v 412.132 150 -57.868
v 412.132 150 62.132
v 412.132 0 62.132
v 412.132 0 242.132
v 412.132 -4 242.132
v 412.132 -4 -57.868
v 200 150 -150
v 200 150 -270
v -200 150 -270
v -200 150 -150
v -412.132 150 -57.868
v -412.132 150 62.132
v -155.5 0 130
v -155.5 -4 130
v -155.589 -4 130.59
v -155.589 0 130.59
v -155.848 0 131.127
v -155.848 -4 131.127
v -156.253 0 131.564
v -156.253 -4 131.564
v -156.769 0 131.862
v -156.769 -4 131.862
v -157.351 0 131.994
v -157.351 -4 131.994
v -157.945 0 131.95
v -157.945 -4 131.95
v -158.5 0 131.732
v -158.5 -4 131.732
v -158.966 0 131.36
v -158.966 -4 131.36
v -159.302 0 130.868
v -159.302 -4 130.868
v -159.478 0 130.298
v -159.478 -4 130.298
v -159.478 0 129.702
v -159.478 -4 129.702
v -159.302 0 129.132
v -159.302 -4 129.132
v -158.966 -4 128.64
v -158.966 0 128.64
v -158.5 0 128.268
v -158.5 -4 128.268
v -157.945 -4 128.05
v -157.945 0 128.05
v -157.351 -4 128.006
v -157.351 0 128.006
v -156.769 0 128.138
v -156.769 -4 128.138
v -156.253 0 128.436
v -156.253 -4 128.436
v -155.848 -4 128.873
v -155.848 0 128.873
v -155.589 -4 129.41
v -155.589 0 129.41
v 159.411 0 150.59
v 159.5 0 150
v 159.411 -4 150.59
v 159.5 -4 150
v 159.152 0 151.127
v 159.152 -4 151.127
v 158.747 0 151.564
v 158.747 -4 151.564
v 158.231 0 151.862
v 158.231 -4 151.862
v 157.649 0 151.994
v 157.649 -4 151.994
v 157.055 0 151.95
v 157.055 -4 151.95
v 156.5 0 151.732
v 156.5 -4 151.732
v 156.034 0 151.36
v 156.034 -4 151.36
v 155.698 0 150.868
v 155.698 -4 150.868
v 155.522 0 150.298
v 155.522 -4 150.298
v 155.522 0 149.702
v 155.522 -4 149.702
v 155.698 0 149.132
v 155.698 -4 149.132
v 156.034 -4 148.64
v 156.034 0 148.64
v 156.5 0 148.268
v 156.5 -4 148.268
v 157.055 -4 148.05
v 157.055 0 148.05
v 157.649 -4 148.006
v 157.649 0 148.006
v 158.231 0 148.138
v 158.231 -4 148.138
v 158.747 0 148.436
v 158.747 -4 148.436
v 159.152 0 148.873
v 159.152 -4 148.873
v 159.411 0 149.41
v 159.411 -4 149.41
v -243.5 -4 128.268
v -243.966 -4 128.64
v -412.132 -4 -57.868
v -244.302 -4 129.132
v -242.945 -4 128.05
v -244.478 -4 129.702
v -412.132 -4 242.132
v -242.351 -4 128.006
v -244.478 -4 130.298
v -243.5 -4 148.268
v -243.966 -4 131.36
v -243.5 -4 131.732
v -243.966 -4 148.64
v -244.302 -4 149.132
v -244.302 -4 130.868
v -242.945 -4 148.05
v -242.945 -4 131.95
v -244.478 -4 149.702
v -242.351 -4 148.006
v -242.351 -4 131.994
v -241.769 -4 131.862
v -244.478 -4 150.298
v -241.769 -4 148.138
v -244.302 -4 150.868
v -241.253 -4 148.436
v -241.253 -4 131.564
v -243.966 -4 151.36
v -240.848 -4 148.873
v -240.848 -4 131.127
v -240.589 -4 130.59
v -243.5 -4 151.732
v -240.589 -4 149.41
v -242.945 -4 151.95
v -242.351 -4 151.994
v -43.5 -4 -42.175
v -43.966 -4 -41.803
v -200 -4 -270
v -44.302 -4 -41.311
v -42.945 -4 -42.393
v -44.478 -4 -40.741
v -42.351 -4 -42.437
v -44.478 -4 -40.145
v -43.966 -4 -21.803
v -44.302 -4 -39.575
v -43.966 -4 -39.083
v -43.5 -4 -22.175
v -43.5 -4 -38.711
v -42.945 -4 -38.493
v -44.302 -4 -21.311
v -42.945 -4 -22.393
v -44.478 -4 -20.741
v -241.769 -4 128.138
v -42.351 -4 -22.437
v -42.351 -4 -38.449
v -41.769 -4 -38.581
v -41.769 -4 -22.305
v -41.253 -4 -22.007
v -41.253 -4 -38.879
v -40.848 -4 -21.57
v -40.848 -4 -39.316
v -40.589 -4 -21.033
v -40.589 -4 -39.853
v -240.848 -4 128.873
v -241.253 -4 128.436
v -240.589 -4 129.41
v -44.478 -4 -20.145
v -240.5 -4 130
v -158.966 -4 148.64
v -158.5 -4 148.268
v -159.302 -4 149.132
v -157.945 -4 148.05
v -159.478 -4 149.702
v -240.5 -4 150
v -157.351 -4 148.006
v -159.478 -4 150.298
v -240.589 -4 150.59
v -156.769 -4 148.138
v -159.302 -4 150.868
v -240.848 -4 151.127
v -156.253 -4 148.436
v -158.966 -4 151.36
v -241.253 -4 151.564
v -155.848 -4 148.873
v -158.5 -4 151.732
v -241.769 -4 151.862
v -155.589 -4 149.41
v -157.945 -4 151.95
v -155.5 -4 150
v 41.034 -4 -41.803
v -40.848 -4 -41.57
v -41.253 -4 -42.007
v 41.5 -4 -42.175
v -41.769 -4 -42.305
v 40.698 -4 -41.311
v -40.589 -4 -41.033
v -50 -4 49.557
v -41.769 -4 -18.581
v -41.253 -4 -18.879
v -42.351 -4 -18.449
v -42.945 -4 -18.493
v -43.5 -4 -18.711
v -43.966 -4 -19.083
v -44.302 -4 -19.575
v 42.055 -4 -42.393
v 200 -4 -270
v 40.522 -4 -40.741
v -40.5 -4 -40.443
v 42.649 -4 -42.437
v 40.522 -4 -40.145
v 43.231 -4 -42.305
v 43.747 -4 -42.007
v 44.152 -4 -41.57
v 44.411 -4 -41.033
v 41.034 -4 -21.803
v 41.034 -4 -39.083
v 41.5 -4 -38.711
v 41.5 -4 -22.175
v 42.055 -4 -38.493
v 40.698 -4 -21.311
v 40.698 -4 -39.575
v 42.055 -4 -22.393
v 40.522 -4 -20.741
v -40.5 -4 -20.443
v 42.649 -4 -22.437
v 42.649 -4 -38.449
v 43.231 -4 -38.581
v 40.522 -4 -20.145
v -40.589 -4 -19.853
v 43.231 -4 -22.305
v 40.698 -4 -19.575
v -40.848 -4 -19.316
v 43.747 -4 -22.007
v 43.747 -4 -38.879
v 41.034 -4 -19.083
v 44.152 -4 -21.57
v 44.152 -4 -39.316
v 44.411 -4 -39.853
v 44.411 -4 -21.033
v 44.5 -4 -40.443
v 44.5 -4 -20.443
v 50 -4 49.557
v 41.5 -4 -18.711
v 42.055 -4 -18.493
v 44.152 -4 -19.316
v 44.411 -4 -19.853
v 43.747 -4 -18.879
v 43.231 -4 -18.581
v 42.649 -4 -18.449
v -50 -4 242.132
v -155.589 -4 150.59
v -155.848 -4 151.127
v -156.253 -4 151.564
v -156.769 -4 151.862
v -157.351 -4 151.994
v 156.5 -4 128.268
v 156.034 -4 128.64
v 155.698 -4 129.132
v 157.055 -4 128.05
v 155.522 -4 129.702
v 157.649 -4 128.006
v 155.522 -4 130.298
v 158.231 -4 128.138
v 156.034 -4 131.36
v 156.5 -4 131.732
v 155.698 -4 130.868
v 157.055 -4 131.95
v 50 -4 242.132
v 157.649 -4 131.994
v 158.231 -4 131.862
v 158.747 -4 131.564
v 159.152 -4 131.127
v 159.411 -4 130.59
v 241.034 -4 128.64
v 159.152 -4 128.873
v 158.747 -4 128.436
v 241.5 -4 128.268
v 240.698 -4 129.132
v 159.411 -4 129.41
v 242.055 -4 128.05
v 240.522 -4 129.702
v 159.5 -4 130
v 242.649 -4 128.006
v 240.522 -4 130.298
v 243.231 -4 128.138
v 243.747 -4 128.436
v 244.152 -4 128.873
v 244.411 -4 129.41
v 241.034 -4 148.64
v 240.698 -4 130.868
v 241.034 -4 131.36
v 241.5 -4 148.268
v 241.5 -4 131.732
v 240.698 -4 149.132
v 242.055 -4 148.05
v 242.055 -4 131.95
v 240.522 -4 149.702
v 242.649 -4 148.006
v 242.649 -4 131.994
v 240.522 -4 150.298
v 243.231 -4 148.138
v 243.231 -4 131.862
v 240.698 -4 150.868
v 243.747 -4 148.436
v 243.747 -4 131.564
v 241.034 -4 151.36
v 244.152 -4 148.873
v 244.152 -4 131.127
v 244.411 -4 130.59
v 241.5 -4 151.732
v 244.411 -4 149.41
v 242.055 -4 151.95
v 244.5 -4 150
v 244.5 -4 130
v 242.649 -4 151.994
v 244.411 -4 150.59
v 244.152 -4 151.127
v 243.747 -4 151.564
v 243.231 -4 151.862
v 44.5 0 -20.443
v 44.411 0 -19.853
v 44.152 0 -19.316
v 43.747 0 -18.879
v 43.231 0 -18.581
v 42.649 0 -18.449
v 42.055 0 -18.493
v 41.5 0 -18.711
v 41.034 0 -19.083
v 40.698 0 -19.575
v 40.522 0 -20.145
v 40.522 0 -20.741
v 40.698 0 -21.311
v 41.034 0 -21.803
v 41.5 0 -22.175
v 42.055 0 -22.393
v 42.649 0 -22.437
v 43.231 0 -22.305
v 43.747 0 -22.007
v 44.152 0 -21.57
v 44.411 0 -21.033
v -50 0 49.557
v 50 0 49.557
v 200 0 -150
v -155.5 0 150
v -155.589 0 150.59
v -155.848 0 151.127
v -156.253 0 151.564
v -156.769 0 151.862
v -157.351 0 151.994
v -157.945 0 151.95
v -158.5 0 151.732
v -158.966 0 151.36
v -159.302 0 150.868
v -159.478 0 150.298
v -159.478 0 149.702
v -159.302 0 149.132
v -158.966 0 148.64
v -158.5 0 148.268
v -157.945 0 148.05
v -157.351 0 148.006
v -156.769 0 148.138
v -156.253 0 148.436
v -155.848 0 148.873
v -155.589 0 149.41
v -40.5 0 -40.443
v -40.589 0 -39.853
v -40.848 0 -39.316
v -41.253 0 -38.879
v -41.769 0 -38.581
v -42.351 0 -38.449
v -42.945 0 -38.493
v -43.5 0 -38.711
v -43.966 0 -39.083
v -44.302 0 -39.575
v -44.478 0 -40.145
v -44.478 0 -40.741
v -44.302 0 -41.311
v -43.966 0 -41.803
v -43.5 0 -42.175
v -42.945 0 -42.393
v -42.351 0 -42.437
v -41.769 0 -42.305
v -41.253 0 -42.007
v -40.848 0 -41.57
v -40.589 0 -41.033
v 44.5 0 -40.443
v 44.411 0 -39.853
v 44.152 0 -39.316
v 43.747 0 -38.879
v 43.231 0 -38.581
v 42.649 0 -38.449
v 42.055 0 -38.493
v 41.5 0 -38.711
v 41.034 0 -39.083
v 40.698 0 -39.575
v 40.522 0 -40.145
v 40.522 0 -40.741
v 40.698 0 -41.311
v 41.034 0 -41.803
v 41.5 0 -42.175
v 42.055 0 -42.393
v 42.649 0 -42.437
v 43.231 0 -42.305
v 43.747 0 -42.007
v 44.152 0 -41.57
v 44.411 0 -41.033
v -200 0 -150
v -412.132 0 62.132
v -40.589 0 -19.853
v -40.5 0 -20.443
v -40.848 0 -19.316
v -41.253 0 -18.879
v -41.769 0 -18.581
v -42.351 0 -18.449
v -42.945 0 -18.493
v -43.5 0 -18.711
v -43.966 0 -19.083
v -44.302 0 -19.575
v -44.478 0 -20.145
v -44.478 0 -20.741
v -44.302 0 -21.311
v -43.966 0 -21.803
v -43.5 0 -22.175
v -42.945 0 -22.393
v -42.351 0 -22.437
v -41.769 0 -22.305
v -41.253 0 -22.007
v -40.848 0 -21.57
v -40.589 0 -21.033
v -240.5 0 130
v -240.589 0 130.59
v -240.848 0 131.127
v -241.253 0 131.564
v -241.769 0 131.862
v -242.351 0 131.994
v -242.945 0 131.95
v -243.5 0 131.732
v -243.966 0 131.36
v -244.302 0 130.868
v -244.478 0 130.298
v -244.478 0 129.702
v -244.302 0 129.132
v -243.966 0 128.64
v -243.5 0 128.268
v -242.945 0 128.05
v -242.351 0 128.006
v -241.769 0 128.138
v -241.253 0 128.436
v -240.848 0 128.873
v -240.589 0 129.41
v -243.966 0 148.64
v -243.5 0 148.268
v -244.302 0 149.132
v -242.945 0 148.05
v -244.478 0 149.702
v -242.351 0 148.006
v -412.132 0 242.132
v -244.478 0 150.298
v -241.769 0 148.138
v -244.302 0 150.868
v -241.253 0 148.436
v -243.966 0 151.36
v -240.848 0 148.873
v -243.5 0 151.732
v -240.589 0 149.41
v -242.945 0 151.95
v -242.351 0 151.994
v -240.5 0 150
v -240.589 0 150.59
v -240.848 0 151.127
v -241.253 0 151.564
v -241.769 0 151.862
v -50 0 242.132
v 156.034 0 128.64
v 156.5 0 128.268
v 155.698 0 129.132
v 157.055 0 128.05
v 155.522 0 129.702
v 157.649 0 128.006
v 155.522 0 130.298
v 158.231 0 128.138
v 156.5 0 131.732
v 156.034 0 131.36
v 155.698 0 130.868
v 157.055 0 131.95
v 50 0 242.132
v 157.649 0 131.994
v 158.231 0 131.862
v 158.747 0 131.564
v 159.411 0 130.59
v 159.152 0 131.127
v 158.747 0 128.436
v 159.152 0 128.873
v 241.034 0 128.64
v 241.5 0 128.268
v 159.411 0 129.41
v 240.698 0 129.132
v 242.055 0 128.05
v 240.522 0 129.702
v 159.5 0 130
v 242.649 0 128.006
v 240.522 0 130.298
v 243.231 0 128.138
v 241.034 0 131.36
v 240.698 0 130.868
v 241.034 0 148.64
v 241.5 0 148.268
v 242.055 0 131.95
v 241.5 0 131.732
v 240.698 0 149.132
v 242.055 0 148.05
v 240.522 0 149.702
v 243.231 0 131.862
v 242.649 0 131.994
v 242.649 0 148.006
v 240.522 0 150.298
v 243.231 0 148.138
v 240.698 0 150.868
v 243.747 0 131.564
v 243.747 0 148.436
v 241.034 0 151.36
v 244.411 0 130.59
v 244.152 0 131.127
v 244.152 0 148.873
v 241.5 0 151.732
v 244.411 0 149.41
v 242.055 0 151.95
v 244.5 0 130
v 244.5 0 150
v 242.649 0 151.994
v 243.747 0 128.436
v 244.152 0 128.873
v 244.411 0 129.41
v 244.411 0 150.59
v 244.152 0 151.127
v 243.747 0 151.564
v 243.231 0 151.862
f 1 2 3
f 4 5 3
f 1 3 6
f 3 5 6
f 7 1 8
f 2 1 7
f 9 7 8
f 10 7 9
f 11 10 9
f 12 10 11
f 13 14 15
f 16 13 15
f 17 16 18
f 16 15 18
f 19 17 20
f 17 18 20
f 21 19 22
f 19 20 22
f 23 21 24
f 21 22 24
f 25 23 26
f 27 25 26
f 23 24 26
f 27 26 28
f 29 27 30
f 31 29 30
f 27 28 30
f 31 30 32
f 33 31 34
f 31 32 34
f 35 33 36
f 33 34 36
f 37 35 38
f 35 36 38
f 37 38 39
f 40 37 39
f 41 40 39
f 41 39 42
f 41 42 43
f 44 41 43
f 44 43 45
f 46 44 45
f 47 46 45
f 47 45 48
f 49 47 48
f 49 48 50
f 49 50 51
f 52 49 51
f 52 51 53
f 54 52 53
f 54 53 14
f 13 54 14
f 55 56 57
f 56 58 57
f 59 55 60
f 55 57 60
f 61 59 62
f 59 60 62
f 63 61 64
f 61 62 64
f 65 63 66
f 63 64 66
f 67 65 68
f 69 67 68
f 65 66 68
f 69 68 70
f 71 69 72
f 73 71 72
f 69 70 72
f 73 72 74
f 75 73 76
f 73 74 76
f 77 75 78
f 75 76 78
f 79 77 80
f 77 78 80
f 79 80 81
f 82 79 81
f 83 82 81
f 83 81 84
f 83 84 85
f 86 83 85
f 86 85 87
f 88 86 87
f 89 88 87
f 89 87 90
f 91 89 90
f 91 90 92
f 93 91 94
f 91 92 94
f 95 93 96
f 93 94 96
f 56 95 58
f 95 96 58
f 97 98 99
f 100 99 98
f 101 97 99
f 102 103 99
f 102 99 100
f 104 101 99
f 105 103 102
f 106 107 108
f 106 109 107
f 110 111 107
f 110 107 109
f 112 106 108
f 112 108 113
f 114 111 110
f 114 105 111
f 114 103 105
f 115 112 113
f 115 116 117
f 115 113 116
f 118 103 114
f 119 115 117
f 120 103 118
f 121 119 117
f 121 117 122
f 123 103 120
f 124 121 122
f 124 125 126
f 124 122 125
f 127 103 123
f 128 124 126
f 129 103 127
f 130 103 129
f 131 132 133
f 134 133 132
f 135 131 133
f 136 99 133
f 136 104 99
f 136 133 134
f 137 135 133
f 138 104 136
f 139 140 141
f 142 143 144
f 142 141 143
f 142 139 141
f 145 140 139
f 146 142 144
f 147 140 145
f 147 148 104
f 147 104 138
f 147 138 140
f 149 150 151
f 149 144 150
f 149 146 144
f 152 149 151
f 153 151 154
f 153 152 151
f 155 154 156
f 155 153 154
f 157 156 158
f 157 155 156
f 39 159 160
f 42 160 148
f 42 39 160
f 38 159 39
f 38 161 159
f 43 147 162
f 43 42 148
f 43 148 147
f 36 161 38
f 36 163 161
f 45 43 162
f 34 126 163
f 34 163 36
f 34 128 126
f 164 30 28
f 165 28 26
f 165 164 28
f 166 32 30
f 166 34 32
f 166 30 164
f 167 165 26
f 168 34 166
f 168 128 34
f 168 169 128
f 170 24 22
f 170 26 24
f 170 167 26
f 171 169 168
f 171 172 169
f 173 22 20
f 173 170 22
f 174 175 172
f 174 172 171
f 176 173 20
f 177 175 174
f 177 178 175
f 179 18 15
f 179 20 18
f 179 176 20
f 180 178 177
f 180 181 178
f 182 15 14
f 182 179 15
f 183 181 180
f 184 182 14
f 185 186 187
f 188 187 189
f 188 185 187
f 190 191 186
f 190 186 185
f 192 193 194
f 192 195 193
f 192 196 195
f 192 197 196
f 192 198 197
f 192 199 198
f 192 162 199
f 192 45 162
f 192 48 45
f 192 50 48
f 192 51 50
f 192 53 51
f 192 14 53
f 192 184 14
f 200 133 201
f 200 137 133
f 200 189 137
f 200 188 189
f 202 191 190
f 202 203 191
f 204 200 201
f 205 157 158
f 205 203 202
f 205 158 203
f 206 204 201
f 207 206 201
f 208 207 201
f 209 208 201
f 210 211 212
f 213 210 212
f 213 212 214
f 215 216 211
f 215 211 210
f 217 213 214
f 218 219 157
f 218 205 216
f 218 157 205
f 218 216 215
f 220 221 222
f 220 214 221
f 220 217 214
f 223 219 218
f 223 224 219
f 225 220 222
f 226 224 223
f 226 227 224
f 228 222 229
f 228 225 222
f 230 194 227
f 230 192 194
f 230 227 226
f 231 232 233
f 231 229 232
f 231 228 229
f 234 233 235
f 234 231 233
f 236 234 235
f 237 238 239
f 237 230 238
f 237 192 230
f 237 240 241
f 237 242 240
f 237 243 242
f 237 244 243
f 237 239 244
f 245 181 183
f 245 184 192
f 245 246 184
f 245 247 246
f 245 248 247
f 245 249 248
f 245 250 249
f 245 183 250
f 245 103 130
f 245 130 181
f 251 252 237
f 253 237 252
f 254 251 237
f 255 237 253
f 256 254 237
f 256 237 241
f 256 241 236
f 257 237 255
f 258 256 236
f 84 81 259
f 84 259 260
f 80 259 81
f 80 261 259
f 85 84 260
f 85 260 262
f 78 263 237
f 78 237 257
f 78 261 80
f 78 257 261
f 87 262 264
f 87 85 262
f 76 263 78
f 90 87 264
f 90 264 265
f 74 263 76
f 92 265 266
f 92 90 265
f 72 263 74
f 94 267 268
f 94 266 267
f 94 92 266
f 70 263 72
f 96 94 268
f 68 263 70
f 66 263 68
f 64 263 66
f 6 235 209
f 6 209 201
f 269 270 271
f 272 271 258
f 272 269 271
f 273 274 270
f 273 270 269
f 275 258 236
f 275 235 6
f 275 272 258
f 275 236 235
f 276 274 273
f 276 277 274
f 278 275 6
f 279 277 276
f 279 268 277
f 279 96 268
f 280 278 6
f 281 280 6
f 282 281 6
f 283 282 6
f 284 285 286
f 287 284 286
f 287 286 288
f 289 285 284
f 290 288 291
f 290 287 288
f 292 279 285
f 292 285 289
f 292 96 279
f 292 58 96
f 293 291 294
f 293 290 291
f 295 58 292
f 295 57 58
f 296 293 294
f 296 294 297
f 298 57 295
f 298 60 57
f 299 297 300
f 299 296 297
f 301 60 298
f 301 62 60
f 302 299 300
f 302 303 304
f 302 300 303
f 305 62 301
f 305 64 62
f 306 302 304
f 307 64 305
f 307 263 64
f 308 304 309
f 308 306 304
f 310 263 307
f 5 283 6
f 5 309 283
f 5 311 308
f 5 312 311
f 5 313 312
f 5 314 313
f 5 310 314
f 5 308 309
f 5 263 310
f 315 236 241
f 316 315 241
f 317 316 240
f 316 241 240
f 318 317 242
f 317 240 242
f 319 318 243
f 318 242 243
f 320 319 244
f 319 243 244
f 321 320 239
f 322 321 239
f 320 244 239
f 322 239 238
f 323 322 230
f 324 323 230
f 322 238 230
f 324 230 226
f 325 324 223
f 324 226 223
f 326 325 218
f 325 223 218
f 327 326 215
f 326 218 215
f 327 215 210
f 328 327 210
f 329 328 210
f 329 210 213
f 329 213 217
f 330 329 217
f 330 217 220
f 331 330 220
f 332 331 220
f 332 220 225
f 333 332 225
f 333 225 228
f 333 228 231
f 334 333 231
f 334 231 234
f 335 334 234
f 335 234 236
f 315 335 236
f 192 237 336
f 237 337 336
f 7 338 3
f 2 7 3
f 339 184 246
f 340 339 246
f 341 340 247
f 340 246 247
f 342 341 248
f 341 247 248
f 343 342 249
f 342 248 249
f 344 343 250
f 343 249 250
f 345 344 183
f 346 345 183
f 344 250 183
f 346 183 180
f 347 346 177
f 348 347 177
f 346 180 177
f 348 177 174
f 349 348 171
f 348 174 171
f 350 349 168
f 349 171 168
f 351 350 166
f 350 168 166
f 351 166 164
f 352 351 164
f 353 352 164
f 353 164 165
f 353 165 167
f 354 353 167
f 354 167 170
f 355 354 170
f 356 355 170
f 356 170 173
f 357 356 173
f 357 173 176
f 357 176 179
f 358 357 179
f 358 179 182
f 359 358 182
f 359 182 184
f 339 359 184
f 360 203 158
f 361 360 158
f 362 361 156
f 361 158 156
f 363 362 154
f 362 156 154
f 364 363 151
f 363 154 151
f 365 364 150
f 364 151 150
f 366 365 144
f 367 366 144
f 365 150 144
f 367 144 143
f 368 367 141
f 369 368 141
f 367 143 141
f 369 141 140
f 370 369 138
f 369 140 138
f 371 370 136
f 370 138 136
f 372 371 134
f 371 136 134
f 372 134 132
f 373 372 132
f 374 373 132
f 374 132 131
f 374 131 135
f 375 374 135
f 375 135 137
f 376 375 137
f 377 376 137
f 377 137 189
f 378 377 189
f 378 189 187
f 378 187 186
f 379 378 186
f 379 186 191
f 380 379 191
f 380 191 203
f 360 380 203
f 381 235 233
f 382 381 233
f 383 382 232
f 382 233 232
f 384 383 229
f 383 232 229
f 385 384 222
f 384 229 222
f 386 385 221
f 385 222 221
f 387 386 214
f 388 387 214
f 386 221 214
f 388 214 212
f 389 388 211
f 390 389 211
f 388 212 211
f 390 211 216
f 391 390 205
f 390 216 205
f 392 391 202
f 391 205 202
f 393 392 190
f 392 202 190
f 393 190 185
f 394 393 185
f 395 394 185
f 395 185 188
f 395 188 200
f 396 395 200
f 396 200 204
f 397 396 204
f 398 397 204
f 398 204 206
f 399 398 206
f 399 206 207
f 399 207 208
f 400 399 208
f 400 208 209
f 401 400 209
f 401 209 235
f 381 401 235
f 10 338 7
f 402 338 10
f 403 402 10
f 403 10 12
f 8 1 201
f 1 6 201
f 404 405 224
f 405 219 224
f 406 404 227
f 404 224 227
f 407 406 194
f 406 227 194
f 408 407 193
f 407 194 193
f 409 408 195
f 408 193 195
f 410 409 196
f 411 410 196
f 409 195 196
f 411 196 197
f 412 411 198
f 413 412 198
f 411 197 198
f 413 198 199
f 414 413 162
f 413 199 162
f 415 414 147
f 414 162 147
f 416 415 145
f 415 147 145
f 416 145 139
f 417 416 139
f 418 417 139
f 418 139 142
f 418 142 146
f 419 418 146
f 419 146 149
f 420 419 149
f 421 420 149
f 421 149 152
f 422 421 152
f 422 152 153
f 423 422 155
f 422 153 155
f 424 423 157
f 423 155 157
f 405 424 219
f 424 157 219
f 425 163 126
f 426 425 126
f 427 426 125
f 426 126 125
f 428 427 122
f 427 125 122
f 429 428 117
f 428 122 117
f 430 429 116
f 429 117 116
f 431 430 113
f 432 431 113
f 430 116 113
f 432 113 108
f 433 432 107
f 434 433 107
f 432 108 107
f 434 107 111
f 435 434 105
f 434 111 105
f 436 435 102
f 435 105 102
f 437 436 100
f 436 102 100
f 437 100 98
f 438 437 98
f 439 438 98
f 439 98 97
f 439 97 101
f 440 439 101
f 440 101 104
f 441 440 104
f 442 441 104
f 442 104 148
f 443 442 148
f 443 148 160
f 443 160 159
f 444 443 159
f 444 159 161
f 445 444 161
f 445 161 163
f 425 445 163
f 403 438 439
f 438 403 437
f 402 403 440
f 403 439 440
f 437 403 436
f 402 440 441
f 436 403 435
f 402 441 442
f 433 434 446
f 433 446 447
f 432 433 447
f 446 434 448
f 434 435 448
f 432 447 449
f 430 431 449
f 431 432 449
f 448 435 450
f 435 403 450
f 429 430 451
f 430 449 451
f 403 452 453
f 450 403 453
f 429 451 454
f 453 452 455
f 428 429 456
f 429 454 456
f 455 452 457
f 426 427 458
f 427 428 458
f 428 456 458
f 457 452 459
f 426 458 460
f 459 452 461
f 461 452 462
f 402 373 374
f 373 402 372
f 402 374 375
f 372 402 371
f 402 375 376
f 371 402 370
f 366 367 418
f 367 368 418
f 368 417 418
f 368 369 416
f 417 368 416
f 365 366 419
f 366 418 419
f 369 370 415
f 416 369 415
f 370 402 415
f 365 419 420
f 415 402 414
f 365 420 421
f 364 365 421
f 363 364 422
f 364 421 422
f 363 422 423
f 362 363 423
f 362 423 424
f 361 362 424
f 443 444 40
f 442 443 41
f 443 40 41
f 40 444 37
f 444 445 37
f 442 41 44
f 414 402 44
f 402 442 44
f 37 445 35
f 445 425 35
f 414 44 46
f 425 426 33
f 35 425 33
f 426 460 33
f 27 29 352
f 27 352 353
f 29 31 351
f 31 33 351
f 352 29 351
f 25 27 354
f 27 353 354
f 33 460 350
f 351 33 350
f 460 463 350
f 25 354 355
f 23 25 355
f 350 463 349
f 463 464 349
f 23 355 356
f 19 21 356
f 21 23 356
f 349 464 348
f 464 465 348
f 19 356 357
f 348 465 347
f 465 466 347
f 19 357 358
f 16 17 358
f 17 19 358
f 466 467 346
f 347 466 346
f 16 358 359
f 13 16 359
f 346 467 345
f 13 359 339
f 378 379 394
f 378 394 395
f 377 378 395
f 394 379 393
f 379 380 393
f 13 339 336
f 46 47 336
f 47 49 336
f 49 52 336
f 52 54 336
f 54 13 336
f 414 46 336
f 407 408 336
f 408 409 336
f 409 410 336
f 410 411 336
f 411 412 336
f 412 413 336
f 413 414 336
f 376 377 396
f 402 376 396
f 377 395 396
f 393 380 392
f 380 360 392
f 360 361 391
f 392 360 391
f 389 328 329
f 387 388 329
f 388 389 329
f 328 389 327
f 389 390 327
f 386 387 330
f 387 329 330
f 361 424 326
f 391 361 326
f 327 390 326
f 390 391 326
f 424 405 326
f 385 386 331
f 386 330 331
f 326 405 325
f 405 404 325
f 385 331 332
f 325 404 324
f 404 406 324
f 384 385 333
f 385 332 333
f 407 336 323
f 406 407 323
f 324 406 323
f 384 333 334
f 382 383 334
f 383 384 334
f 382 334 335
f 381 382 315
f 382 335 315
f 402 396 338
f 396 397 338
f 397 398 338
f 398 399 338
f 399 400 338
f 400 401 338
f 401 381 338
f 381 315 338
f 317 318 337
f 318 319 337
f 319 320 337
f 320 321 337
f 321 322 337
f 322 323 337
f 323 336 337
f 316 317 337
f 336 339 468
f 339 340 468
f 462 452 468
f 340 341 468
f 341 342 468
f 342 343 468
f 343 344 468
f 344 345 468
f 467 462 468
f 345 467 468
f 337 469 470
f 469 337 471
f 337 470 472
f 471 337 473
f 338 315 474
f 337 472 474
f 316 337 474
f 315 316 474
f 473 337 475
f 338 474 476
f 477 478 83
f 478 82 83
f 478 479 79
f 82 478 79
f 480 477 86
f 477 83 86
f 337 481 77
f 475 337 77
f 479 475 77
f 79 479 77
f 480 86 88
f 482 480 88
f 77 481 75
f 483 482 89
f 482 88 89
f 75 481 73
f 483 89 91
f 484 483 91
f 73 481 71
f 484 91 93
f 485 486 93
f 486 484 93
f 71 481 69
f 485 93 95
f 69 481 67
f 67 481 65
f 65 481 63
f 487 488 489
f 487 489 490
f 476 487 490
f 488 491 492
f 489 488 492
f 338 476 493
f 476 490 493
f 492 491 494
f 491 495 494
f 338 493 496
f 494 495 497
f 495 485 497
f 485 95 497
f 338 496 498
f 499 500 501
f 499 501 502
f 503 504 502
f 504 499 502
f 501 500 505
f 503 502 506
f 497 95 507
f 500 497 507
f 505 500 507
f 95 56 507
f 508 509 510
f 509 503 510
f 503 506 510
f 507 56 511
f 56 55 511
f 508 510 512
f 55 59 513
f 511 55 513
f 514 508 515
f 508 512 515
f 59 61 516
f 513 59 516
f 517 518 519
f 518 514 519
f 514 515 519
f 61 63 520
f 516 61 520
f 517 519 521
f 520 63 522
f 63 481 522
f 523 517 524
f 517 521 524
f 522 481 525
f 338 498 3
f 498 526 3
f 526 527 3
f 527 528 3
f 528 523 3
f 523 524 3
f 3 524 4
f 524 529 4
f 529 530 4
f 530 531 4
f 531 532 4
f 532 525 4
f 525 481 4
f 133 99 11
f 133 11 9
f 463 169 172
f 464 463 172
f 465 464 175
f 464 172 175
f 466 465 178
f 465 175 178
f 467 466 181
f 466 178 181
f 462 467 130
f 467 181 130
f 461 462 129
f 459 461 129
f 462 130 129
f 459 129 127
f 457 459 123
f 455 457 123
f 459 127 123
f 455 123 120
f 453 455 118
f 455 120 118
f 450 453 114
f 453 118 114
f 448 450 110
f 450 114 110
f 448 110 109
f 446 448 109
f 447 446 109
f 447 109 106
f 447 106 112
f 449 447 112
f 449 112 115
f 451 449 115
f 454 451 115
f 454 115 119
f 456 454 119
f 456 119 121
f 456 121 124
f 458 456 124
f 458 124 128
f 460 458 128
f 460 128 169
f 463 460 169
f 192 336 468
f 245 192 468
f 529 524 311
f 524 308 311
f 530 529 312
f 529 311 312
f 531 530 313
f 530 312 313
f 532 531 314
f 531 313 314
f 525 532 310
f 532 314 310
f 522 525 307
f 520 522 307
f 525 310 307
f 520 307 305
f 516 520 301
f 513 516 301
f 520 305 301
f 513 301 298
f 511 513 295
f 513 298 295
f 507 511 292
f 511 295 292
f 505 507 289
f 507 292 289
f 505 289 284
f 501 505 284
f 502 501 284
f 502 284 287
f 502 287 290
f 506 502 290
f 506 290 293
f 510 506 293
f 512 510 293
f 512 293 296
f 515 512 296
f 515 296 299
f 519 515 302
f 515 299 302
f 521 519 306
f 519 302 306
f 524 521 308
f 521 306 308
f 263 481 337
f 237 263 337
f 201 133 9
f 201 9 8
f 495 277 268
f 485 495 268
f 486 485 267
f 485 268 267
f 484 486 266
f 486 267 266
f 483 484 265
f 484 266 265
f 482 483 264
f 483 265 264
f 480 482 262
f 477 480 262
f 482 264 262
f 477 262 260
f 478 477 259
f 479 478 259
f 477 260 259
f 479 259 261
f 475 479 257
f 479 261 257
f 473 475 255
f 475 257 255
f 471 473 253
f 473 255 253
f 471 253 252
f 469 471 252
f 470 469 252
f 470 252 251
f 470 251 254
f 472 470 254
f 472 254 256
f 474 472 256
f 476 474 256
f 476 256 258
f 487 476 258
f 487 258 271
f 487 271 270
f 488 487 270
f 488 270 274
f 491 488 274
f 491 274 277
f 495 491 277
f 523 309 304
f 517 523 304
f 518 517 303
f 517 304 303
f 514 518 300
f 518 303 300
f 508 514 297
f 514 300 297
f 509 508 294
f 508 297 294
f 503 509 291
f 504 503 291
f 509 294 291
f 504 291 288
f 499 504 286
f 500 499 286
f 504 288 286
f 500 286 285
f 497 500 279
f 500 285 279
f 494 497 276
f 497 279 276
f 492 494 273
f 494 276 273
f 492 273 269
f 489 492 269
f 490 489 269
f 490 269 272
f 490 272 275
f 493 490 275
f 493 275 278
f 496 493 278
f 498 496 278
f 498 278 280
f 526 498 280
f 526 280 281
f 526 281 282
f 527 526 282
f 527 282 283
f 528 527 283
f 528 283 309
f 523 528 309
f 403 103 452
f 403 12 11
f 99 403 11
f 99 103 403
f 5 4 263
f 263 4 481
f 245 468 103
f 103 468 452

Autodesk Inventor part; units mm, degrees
ref_plane "YZ Plane" through (0, 0, 0) normal (1, 0, 0) x (0, 1, 0)
ref_plane "XZ Plane" through (0, 0, 0) normal (0, 1, 0) x (-1, 0, 0)
ref_plane "XY Plane" through (0, 0, 0) normal (0, 0, 1) x (1, 0, 0)
sketch "Sketch2" plane through (0, 0, 0) normal (0, 1, 0) x (-1, 0, 0)
  line L0 (-200, -150) -> (200, -150)
  line L1 (200, -150) -> (200, -200)
  line L2 (-200, -200) -> (-200, -150)
  line L3 (0, -269.3547) -> (0, -73.2831)
  line L4 (200, -200) -> (200, -270)
  line L5 (200, -270) -> (-200, -270)
  line L6 (-200, -270) -> (-200, -200)
  line L7 (200, -150) -> (412.132, 62.132)
  line L8 (200, -150) -> (500, -150) construction
  line L9 (412.132, 62.132) -> (412.132, -57.868)
  line L10 (412.132, -57.868) -> (200, -270)
  line L11 (-200, -150) -> (-412.132, 62.132)
  line L12 (-412.132, 62.132) -> (-412.132, -57.868)
  line L13 (-412.132, -57.868) -> (-200, -270)
  point P0 (0, 0)
  point P1 (0, -175)
  point P2 (412.5, 61.0149)
  dimension "d9" = 400
  dimension "d10" = 50
  dimension "d39" = 70
  dimension "d40" = 200
  dimension "d41" = 45
  dimension "d42" = 120
  dimension "d43" = 150
  dimension "d51" = 300
extrude "Extrusion2" add sketch "Sketch2" along normal blind 150
sketch "Sketch8" plane through (0, 0, 0) normal (0, -1, 0) x (1, 0, 0)
  line L0 (412.132, -57.868) -> (200, -270) projected
  line L1 (200, -270) -> (-200, -270) projected
  line L2 (-200, -270) -> (-412.132, -57.868) projected
  line L3 (-412.132, -57.868) -> (-412.132, 62.132) projected
  line L4 (-412.132, 62.132) -> (-200, -150) projected
  line L5 (-200, -150) -> (200, -150) projected
  line L6 (200, -150) -> (412.132, 62.132) projected
  line L7 (412.132, 62.132) -> (412.132, -57.868) projected
  line L8 (-412.132, 62.132) -> (-412.132, 242.132)
  line L9 (412.132, 62.132) -> (412.132, 242.132)
  line L10 (-412.132, 62.132) -> (-412.132, -57.868)
  line L11 (-412.132, -57.868) -> (-200, -270)
  line L12 (-200, -270) -> (200, -270)
  line L13 (200, -270) -> (412.132, -57.868)
  line L14 (412.132, -57.868) -> (412.132, 62.132)
  line L15 (50, 242.132) -> (50, 49.557)
  line L16 (50, 49.557) -> (-50, 49.557)
  line L17 (-50, 49.557) -> (-50, 242.132)
  line L18 (412.132, 242.132) -> (50, 242.132)
  line L19 (-50, 242.132) -> (-412.132, 242.132)
  dimension "d45" = 180
  dimension "d46" = 180
  dimension "d47" = 100
extrude "Extrusion9" add sketch "Sketch8" along normal blind 4
sketch "Sketch9" plane through (0, -4, 0) normal (0, -1, 0) x (1, 0, 0)
  line L0 (200, -270) -> (-200, -270) projected
  line L1 (-200, -270) -> (-412.132, -57.868) projected
  line L2 (-412.132, -57.868) -> (-412.132, 242.132) projected
  line L3 (-412.132, 242.132) -> (-50, 242.132) projected
  line L4 (-50, 242.132) -> (-50, 49.557) projected
  line L5 (-50, 49.557) -> (50, 49.557) projected
  line L6 (50, 49.557) -> (50, 242.132) projected
  line L7 (50, 242.132) -> (412.132, 242.132) projected
  line L8 (412.132, 242.132) -> (412.132, -57.868) projected
  line L9 (412.132, -57.868) -> (200, -270) projected
  line L10 (200, -270) -> (-200, -270) projected
  line L11 (-200, -270) -> (-412.132, -57.868) projected
  line L12 (-412.132, -57.868) -> (-412.132, 242.132) projected
  line L13 (-412.132, 242.132) -> (-50, 242.132) projected
  line L14 (-50, 242.132) -> (-50, 49.557) projected
  line L15 (-50, 49.557) -> (50, 49.557) projected
  line L16 (50, 49.557) -> (50, 242.132) projected
  line L17 (50, 242.132) -> (412.132, 242.132) projected
  line L18 (412.132, 242.132) -> (412.132, -57.868) projected
  line L19 (412.132, -57.868) -> (200, -270) projected
  line L20 (200, -270) -> (-200, -270) projected
  line L21 (-200, -270) -> (-412.132, -57.868) projected
  line L22 (-412.132, -57.868) -> (-412.132, 242.132) projected
  line L23 (-412.132, 242.132) -> (-50, 242.132) projected
  line L24 (-50, 242.132) -> (-50, 49.557) projected
  line L25 (-50, 49.557) -> (50, 49.557) projected
  line L26 (50, 49.557) -> (50, 242.132) projected
  line L27 (50, 242.132) -> (412.132, 242.132) projected
  line L28 (412.132, 242.132) -> (412.132, -57.868) projected
  line L29 (412.132, -57.868) -> (200, -270) projected
  line L30 (250, 110) -> (250, 190) projected
  line L31 (200, -150) -> (412.132, 62.132) projected
  line L32 (-200, -150) -> (200, -150) projected
  line L33 (-412.132, 62.132) -> (-200, -150) projected
  line L34 (-412.132, 242.132) -> (-412.132, 62.132) projected
  line L35 (-50, 242.132) -> (-412.132, 242.132) projected
  line L36 (-50, 49.557) -> (-50, 242.132) projected
  line L37 (50, 49.557) -> (-50, 49.557) projected
  line L38 (50, 242.132) -> (50, 49.557) projected
  line L39 (412.132, 242.132) -> (50, 242.132) projected
  line L40 (412.132, 62.132) -> (412.132, 242.132) projected
  line L41 (200, -150) -> (412.132, 62.132) projected
  line L42 (-200, -150) -> (200, -150) projected
  line L43 (-412.132, 62.132) -> (-200, -150) projected
  line L44 (-412.132, 242.132) -> (-412.132, 62.132) projected
  line L45 (-50, 242.132) -> (-412.132, 242.132) projected
  line L46 (-50, 49.557) -> (-50, 242.132) projected
  line L47 (50, 49.557) -> (-50, 49.557) projected
  line L48 (50, 242.132) -> (50, 49.557) projected
  line L49 (412.132, 242.132) -> (50, 242.132) projected
  line L50 (412.132, 62.132) -> (412.132, 242.132) projected
  circle A0 centre (242.5, 150) radius 2
  circle A1 centre (242.5, 130) radius 2
  line L51 (200, 190) -> (200, 110) construction
  circle A2 centre (157.5, 150) radius 2
  circle A3 centre (157.5, 130) radius 2
  circle A4 centre (42.5, -20.443) radius 2
  circle A5 centre (42.5, -40.443) radius 2
  circle A6 centre (-42.5, -20.443) radius 2
  circle A7 centre (-42.5, -40.443) radius 2
  circle A8 centre (-157.5, 150) radius 2
  circle A9 centre (-157.5, 130) radius 2
  circle A10 centre (-242.5, 150) radius 2
  circle A11 centre (-242.5, 130) radius 2
  point P0 (0, 0)
  point P1 (0, 19.557)
  point P2 (-200, 190)
  dimension "d52" = 4
  dimension "d54" = 7.5
  dimension "d55" = 4
  dimension "d56" = 0
  dimension "d57" = 20
  dimension "d58" = 4
  dimension "d59" = 4
  dimension "d60" = 0
  dimension "d61" = 20
  dimension "d62" = 4
  dimension "d63" = 4
  dimension "d64" = 0
  dimension "d65" = 20
extrude "Extrusion10" cut sketch "Sketch9" against normal up to surface (4 mm away) contours A0 | A1 | A2 | A3 | A4 | A5 | A6 | A7 | A8 | A9 | A10 | A11
equation "\"d40\" = 0.5 * d9"
properties part number "Charging Dock" material "ABS Plastic"
